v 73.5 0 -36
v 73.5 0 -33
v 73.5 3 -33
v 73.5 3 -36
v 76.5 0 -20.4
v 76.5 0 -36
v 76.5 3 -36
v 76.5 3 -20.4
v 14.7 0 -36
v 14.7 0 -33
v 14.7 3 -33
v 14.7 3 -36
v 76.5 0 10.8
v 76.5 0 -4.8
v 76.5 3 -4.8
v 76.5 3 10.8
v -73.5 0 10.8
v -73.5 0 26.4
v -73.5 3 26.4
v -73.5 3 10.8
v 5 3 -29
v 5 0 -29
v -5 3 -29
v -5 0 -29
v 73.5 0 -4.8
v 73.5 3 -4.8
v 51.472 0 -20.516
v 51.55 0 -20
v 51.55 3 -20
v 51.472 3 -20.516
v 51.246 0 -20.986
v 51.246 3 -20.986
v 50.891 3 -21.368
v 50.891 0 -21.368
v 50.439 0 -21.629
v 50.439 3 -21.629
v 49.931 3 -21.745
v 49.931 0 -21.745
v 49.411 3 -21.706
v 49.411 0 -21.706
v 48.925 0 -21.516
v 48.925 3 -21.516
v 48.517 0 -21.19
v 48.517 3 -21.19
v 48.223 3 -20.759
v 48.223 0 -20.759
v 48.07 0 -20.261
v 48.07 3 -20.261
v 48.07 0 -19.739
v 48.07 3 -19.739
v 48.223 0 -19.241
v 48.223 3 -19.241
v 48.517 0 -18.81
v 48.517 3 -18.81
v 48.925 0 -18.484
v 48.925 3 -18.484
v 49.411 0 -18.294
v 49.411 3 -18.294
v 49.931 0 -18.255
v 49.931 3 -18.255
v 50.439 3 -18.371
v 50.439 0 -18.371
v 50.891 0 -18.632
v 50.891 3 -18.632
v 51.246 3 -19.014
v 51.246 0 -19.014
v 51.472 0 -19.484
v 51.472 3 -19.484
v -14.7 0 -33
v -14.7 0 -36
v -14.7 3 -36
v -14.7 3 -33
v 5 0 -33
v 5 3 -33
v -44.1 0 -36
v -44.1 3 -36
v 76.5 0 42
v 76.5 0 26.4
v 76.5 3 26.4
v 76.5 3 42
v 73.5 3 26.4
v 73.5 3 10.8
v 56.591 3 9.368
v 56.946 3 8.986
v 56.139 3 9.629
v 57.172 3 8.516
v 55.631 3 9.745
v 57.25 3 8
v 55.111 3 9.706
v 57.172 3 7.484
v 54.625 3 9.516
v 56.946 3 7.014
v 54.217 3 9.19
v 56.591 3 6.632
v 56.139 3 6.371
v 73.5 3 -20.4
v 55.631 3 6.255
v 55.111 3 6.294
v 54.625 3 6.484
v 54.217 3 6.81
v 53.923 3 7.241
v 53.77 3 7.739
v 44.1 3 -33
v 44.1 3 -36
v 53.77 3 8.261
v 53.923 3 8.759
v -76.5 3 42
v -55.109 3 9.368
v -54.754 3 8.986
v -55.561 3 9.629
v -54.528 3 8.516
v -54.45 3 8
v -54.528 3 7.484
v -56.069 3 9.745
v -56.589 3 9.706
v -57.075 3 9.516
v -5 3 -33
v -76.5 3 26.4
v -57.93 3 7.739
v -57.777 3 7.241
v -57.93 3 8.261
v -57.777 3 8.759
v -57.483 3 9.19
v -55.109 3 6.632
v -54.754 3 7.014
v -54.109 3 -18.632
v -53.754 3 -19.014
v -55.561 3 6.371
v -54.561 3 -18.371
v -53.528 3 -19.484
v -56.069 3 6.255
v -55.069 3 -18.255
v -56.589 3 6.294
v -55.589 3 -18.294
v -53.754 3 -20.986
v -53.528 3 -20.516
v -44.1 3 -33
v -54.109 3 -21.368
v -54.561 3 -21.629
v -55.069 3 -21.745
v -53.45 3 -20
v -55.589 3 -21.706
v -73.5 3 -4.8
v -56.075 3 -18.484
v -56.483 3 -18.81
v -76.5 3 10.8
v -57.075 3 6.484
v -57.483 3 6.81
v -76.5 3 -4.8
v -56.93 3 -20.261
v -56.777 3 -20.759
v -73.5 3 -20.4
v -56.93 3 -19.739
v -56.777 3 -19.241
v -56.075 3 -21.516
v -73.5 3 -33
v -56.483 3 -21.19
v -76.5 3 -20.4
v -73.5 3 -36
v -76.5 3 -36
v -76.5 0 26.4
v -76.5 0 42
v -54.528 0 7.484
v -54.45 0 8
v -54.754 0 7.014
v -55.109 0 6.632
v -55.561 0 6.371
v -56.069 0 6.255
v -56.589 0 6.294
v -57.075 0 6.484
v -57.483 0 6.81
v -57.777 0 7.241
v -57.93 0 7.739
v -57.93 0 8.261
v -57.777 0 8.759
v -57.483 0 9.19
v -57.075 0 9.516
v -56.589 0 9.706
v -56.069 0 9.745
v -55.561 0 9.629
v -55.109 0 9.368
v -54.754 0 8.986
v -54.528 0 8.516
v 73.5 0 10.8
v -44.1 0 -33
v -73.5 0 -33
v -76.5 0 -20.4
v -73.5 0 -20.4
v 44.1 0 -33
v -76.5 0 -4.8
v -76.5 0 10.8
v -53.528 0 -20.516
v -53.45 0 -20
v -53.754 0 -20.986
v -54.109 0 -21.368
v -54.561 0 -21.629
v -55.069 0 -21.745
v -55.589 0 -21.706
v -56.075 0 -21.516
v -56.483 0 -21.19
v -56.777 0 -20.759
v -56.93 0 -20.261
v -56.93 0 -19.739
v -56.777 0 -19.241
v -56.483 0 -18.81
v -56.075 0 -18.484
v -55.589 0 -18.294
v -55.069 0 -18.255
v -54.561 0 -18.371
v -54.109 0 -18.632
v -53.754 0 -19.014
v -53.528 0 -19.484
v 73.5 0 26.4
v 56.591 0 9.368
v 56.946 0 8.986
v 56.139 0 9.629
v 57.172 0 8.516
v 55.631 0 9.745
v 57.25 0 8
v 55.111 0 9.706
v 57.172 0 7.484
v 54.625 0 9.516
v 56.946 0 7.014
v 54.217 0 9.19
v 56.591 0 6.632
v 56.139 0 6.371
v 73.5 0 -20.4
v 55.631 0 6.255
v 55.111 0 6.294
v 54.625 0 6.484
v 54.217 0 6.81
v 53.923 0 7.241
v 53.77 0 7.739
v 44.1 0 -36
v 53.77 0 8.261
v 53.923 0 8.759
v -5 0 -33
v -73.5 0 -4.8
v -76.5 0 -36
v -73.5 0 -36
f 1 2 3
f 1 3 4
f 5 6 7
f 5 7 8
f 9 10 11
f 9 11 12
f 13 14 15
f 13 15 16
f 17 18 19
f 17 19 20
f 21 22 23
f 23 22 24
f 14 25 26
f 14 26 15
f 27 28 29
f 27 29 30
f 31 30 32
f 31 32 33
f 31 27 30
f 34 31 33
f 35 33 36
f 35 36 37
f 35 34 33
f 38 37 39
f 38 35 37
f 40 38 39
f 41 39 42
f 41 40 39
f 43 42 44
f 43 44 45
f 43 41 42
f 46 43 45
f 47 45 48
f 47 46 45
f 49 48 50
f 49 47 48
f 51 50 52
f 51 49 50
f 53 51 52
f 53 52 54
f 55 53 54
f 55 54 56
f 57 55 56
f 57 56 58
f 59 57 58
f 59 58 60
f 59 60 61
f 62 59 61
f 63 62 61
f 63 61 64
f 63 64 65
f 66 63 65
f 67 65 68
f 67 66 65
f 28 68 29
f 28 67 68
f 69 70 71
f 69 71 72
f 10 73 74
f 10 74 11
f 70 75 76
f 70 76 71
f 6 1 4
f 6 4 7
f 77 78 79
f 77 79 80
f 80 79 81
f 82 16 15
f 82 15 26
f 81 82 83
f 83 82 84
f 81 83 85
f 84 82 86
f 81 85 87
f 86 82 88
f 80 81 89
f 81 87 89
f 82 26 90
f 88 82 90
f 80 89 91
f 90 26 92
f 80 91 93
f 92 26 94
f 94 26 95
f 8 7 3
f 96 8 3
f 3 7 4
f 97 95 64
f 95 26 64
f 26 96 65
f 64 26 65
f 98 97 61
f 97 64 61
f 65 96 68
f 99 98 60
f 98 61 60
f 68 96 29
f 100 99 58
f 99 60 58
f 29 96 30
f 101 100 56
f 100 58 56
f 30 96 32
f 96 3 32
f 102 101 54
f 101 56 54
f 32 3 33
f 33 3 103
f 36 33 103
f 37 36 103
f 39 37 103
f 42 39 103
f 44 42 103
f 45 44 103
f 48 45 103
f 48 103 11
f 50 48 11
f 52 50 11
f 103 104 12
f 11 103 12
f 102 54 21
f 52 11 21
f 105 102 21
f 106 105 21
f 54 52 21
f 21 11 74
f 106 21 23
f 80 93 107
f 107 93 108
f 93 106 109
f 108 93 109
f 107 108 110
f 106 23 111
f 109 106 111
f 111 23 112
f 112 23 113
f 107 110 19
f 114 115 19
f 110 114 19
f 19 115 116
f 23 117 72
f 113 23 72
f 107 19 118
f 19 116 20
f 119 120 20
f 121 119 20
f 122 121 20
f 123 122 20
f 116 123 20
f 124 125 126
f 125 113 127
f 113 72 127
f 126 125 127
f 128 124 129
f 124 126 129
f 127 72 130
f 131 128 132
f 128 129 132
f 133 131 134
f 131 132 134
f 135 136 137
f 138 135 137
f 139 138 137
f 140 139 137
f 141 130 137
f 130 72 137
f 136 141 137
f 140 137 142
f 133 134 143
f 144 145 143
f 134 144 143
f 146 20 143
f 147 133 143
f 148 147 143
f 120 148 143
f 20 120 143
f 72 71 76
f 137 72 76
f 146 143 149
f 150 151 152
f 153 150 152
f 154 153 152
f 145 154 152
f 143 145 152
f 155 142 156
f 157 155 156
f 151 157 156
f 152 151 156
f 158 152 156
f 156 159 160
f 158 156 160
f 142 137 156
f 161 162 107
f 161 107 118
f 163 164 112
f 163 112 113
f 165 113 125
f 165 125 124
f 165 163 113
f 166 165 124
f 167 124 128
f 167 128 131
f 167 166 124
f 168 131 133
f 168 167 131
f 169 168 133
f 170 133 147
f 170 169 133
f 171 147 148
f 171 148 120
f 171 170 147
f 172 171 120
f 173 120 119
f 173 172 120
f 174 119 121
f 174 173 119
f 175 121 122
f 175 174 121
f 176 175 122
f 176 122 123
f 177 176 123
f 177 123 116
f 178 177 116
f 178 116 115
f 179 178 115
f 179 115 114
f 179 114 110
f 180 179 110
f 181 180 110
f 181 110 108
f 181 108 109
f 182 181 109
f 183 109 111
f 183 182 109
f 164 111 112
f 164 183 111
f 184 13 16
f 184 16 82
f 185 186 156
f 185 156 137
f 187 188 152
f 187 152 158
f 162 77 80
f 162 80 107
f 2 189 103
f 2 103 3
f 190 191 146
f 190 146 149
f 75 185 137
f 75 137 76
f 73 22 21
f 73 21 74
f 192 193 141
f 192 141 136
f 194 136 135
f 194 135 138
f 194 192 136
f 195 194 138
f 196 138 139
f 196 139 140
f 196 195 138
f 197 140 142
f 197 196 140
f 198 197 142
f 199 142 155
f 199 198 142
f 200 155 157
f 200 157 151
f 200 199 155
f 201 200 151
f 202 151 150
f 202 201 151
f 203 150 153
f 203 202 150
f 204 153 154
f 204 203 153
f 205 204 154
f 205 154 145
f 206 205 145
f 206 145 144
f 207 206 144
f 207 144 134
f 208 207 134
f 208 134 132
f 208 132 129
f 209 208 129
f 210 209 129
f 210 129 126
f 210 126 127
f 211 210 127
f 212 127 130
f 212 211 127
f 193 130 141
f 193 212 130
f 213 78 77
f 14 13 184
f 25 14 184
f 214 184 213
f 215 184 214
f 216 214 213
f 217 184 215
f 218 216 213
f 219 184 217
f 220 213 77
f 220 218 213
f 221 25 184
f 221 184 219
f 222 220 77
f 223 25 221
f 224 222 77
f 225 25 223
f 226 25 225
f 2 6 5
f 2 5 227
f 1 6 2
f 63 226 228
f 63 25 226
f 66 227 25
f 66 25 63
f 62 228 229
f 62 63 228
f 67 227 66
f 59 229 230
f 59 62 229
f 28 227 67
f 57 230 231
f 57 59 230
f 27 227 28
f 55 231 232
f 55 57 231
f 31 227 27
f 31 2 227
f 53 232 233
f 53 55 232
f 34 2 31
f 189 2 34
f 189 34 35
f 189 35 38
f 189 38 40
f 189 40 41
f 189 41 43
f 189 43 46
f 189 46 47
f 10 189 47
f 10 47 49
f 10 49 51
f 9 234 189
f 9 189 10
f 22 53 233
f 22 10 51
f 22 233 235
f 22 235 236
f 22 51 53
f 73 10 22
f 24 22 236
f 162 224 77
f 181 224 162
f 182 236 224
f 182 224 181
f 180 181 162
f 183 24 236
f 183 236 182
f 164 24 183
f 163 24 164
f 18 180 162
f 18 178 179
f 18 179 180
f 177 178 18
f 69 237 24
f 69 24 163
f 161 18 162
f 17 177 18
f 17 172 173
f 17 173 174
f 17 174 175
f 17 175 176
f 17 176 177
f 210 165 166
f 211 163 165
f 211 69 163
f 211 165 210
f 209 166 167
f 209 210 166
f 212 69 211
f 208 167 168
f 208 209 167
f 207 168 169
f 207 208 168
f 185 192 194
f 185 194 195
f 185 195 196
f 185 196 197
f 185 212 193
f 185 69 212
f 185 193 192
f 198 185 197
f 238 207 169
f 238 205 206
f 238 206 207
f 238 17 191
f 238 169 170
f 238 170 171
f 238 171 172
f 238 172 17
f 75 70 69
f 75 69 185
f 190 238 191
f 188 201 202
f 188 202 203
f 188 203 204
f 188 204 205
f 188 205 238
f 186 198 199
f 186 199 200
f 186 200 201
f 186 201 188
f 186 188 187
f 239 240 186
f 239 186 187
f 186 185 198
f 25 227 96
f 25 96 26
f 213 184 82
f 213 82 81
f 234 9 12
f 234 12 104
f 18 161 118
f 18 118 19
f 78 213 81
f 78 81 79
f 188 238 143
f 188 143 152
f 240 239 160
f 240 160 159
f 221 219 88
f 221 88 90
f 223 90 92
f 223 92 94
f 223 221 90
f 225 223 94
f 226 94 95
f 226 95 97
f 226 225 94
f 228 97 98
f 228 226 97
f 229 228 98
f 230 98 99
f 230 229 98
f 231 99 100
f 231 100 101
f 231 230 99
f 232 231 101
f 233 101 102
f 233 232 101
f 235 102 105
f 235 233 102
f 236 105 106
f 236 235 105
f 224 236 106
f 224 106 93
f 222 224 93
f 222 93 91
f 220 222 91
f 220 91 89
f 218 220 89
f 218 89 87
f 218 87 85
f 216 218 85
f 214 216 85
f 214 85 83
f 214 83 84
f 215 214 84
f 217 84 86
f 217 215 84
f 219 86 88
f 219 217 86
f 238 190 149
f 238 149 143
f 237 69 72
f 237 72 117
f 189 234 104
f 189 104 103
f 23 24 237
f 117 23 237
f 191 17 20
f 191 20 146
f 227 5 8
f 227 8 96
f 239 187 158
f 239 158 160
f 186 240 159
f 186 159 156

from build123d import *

# Parameters (mm, degrees)
SKETCH1_R           = 1.75
BOSS_EXTRUDE1_DEPTH = 3


with BuildPart() as part:
    # Sketch1 → Boss-Extrude1 (new body)
    with BuildSketch(Plane(origin=(0, 0, 0), x_dir=(1, 0, 0), z_dir=(0, 1, 0))):
        Polygon((-73.5, 33), (-44.1, 33), (-44.1, 36), (-14.7, 36), (-14.7, 33), (-5, 33), (-5, 32), (-5, 29), (0, 29), (5, 29), (5, 33), (14.7, 33), (14.7, 36), (44.1, 36), (44.1, 33), (73.5, 33), (73.5, 36), (76.5, 36), (76.5, 20.4), (73.5, 20.4), (73.5, 4.8), (76.5, 4.8), (76.5, -10.8), (73.5, -10.8), (73.5, -26.4), (76.5, -26.4), (76.5, -42), (-76.5, -42), (-76.5, -26.4), (-73.5, -26.4), (-73.5, -10.8), (-76.5, -10.8), (-76.5, 4.8), (-73.5, 4.8), (-73.5, 20.4), (-76.5, 20.4), (-76.5, 36), (-73.5, 36), align=None)
        with Locations((-56.2, -8)):
            Circle(SKETCH1_R, mode=Mode.SUBTRACT)
        with Locations((-55.2, 20)):
            Circle(SKETCH1_R, mode=Mode.SUBTRACT)
        with Locations((49.8, 20)):
            Circle(SKETCH1_R, mode=Mode.SUBTRACT)
        with Locations((55.5, -8)):
            Circle(SKETCH1_R, mode=Mode.SUBTRACT)
    extrude(amount=BOSS_EXTRUDE1_DEPTH)


solid = part.part
